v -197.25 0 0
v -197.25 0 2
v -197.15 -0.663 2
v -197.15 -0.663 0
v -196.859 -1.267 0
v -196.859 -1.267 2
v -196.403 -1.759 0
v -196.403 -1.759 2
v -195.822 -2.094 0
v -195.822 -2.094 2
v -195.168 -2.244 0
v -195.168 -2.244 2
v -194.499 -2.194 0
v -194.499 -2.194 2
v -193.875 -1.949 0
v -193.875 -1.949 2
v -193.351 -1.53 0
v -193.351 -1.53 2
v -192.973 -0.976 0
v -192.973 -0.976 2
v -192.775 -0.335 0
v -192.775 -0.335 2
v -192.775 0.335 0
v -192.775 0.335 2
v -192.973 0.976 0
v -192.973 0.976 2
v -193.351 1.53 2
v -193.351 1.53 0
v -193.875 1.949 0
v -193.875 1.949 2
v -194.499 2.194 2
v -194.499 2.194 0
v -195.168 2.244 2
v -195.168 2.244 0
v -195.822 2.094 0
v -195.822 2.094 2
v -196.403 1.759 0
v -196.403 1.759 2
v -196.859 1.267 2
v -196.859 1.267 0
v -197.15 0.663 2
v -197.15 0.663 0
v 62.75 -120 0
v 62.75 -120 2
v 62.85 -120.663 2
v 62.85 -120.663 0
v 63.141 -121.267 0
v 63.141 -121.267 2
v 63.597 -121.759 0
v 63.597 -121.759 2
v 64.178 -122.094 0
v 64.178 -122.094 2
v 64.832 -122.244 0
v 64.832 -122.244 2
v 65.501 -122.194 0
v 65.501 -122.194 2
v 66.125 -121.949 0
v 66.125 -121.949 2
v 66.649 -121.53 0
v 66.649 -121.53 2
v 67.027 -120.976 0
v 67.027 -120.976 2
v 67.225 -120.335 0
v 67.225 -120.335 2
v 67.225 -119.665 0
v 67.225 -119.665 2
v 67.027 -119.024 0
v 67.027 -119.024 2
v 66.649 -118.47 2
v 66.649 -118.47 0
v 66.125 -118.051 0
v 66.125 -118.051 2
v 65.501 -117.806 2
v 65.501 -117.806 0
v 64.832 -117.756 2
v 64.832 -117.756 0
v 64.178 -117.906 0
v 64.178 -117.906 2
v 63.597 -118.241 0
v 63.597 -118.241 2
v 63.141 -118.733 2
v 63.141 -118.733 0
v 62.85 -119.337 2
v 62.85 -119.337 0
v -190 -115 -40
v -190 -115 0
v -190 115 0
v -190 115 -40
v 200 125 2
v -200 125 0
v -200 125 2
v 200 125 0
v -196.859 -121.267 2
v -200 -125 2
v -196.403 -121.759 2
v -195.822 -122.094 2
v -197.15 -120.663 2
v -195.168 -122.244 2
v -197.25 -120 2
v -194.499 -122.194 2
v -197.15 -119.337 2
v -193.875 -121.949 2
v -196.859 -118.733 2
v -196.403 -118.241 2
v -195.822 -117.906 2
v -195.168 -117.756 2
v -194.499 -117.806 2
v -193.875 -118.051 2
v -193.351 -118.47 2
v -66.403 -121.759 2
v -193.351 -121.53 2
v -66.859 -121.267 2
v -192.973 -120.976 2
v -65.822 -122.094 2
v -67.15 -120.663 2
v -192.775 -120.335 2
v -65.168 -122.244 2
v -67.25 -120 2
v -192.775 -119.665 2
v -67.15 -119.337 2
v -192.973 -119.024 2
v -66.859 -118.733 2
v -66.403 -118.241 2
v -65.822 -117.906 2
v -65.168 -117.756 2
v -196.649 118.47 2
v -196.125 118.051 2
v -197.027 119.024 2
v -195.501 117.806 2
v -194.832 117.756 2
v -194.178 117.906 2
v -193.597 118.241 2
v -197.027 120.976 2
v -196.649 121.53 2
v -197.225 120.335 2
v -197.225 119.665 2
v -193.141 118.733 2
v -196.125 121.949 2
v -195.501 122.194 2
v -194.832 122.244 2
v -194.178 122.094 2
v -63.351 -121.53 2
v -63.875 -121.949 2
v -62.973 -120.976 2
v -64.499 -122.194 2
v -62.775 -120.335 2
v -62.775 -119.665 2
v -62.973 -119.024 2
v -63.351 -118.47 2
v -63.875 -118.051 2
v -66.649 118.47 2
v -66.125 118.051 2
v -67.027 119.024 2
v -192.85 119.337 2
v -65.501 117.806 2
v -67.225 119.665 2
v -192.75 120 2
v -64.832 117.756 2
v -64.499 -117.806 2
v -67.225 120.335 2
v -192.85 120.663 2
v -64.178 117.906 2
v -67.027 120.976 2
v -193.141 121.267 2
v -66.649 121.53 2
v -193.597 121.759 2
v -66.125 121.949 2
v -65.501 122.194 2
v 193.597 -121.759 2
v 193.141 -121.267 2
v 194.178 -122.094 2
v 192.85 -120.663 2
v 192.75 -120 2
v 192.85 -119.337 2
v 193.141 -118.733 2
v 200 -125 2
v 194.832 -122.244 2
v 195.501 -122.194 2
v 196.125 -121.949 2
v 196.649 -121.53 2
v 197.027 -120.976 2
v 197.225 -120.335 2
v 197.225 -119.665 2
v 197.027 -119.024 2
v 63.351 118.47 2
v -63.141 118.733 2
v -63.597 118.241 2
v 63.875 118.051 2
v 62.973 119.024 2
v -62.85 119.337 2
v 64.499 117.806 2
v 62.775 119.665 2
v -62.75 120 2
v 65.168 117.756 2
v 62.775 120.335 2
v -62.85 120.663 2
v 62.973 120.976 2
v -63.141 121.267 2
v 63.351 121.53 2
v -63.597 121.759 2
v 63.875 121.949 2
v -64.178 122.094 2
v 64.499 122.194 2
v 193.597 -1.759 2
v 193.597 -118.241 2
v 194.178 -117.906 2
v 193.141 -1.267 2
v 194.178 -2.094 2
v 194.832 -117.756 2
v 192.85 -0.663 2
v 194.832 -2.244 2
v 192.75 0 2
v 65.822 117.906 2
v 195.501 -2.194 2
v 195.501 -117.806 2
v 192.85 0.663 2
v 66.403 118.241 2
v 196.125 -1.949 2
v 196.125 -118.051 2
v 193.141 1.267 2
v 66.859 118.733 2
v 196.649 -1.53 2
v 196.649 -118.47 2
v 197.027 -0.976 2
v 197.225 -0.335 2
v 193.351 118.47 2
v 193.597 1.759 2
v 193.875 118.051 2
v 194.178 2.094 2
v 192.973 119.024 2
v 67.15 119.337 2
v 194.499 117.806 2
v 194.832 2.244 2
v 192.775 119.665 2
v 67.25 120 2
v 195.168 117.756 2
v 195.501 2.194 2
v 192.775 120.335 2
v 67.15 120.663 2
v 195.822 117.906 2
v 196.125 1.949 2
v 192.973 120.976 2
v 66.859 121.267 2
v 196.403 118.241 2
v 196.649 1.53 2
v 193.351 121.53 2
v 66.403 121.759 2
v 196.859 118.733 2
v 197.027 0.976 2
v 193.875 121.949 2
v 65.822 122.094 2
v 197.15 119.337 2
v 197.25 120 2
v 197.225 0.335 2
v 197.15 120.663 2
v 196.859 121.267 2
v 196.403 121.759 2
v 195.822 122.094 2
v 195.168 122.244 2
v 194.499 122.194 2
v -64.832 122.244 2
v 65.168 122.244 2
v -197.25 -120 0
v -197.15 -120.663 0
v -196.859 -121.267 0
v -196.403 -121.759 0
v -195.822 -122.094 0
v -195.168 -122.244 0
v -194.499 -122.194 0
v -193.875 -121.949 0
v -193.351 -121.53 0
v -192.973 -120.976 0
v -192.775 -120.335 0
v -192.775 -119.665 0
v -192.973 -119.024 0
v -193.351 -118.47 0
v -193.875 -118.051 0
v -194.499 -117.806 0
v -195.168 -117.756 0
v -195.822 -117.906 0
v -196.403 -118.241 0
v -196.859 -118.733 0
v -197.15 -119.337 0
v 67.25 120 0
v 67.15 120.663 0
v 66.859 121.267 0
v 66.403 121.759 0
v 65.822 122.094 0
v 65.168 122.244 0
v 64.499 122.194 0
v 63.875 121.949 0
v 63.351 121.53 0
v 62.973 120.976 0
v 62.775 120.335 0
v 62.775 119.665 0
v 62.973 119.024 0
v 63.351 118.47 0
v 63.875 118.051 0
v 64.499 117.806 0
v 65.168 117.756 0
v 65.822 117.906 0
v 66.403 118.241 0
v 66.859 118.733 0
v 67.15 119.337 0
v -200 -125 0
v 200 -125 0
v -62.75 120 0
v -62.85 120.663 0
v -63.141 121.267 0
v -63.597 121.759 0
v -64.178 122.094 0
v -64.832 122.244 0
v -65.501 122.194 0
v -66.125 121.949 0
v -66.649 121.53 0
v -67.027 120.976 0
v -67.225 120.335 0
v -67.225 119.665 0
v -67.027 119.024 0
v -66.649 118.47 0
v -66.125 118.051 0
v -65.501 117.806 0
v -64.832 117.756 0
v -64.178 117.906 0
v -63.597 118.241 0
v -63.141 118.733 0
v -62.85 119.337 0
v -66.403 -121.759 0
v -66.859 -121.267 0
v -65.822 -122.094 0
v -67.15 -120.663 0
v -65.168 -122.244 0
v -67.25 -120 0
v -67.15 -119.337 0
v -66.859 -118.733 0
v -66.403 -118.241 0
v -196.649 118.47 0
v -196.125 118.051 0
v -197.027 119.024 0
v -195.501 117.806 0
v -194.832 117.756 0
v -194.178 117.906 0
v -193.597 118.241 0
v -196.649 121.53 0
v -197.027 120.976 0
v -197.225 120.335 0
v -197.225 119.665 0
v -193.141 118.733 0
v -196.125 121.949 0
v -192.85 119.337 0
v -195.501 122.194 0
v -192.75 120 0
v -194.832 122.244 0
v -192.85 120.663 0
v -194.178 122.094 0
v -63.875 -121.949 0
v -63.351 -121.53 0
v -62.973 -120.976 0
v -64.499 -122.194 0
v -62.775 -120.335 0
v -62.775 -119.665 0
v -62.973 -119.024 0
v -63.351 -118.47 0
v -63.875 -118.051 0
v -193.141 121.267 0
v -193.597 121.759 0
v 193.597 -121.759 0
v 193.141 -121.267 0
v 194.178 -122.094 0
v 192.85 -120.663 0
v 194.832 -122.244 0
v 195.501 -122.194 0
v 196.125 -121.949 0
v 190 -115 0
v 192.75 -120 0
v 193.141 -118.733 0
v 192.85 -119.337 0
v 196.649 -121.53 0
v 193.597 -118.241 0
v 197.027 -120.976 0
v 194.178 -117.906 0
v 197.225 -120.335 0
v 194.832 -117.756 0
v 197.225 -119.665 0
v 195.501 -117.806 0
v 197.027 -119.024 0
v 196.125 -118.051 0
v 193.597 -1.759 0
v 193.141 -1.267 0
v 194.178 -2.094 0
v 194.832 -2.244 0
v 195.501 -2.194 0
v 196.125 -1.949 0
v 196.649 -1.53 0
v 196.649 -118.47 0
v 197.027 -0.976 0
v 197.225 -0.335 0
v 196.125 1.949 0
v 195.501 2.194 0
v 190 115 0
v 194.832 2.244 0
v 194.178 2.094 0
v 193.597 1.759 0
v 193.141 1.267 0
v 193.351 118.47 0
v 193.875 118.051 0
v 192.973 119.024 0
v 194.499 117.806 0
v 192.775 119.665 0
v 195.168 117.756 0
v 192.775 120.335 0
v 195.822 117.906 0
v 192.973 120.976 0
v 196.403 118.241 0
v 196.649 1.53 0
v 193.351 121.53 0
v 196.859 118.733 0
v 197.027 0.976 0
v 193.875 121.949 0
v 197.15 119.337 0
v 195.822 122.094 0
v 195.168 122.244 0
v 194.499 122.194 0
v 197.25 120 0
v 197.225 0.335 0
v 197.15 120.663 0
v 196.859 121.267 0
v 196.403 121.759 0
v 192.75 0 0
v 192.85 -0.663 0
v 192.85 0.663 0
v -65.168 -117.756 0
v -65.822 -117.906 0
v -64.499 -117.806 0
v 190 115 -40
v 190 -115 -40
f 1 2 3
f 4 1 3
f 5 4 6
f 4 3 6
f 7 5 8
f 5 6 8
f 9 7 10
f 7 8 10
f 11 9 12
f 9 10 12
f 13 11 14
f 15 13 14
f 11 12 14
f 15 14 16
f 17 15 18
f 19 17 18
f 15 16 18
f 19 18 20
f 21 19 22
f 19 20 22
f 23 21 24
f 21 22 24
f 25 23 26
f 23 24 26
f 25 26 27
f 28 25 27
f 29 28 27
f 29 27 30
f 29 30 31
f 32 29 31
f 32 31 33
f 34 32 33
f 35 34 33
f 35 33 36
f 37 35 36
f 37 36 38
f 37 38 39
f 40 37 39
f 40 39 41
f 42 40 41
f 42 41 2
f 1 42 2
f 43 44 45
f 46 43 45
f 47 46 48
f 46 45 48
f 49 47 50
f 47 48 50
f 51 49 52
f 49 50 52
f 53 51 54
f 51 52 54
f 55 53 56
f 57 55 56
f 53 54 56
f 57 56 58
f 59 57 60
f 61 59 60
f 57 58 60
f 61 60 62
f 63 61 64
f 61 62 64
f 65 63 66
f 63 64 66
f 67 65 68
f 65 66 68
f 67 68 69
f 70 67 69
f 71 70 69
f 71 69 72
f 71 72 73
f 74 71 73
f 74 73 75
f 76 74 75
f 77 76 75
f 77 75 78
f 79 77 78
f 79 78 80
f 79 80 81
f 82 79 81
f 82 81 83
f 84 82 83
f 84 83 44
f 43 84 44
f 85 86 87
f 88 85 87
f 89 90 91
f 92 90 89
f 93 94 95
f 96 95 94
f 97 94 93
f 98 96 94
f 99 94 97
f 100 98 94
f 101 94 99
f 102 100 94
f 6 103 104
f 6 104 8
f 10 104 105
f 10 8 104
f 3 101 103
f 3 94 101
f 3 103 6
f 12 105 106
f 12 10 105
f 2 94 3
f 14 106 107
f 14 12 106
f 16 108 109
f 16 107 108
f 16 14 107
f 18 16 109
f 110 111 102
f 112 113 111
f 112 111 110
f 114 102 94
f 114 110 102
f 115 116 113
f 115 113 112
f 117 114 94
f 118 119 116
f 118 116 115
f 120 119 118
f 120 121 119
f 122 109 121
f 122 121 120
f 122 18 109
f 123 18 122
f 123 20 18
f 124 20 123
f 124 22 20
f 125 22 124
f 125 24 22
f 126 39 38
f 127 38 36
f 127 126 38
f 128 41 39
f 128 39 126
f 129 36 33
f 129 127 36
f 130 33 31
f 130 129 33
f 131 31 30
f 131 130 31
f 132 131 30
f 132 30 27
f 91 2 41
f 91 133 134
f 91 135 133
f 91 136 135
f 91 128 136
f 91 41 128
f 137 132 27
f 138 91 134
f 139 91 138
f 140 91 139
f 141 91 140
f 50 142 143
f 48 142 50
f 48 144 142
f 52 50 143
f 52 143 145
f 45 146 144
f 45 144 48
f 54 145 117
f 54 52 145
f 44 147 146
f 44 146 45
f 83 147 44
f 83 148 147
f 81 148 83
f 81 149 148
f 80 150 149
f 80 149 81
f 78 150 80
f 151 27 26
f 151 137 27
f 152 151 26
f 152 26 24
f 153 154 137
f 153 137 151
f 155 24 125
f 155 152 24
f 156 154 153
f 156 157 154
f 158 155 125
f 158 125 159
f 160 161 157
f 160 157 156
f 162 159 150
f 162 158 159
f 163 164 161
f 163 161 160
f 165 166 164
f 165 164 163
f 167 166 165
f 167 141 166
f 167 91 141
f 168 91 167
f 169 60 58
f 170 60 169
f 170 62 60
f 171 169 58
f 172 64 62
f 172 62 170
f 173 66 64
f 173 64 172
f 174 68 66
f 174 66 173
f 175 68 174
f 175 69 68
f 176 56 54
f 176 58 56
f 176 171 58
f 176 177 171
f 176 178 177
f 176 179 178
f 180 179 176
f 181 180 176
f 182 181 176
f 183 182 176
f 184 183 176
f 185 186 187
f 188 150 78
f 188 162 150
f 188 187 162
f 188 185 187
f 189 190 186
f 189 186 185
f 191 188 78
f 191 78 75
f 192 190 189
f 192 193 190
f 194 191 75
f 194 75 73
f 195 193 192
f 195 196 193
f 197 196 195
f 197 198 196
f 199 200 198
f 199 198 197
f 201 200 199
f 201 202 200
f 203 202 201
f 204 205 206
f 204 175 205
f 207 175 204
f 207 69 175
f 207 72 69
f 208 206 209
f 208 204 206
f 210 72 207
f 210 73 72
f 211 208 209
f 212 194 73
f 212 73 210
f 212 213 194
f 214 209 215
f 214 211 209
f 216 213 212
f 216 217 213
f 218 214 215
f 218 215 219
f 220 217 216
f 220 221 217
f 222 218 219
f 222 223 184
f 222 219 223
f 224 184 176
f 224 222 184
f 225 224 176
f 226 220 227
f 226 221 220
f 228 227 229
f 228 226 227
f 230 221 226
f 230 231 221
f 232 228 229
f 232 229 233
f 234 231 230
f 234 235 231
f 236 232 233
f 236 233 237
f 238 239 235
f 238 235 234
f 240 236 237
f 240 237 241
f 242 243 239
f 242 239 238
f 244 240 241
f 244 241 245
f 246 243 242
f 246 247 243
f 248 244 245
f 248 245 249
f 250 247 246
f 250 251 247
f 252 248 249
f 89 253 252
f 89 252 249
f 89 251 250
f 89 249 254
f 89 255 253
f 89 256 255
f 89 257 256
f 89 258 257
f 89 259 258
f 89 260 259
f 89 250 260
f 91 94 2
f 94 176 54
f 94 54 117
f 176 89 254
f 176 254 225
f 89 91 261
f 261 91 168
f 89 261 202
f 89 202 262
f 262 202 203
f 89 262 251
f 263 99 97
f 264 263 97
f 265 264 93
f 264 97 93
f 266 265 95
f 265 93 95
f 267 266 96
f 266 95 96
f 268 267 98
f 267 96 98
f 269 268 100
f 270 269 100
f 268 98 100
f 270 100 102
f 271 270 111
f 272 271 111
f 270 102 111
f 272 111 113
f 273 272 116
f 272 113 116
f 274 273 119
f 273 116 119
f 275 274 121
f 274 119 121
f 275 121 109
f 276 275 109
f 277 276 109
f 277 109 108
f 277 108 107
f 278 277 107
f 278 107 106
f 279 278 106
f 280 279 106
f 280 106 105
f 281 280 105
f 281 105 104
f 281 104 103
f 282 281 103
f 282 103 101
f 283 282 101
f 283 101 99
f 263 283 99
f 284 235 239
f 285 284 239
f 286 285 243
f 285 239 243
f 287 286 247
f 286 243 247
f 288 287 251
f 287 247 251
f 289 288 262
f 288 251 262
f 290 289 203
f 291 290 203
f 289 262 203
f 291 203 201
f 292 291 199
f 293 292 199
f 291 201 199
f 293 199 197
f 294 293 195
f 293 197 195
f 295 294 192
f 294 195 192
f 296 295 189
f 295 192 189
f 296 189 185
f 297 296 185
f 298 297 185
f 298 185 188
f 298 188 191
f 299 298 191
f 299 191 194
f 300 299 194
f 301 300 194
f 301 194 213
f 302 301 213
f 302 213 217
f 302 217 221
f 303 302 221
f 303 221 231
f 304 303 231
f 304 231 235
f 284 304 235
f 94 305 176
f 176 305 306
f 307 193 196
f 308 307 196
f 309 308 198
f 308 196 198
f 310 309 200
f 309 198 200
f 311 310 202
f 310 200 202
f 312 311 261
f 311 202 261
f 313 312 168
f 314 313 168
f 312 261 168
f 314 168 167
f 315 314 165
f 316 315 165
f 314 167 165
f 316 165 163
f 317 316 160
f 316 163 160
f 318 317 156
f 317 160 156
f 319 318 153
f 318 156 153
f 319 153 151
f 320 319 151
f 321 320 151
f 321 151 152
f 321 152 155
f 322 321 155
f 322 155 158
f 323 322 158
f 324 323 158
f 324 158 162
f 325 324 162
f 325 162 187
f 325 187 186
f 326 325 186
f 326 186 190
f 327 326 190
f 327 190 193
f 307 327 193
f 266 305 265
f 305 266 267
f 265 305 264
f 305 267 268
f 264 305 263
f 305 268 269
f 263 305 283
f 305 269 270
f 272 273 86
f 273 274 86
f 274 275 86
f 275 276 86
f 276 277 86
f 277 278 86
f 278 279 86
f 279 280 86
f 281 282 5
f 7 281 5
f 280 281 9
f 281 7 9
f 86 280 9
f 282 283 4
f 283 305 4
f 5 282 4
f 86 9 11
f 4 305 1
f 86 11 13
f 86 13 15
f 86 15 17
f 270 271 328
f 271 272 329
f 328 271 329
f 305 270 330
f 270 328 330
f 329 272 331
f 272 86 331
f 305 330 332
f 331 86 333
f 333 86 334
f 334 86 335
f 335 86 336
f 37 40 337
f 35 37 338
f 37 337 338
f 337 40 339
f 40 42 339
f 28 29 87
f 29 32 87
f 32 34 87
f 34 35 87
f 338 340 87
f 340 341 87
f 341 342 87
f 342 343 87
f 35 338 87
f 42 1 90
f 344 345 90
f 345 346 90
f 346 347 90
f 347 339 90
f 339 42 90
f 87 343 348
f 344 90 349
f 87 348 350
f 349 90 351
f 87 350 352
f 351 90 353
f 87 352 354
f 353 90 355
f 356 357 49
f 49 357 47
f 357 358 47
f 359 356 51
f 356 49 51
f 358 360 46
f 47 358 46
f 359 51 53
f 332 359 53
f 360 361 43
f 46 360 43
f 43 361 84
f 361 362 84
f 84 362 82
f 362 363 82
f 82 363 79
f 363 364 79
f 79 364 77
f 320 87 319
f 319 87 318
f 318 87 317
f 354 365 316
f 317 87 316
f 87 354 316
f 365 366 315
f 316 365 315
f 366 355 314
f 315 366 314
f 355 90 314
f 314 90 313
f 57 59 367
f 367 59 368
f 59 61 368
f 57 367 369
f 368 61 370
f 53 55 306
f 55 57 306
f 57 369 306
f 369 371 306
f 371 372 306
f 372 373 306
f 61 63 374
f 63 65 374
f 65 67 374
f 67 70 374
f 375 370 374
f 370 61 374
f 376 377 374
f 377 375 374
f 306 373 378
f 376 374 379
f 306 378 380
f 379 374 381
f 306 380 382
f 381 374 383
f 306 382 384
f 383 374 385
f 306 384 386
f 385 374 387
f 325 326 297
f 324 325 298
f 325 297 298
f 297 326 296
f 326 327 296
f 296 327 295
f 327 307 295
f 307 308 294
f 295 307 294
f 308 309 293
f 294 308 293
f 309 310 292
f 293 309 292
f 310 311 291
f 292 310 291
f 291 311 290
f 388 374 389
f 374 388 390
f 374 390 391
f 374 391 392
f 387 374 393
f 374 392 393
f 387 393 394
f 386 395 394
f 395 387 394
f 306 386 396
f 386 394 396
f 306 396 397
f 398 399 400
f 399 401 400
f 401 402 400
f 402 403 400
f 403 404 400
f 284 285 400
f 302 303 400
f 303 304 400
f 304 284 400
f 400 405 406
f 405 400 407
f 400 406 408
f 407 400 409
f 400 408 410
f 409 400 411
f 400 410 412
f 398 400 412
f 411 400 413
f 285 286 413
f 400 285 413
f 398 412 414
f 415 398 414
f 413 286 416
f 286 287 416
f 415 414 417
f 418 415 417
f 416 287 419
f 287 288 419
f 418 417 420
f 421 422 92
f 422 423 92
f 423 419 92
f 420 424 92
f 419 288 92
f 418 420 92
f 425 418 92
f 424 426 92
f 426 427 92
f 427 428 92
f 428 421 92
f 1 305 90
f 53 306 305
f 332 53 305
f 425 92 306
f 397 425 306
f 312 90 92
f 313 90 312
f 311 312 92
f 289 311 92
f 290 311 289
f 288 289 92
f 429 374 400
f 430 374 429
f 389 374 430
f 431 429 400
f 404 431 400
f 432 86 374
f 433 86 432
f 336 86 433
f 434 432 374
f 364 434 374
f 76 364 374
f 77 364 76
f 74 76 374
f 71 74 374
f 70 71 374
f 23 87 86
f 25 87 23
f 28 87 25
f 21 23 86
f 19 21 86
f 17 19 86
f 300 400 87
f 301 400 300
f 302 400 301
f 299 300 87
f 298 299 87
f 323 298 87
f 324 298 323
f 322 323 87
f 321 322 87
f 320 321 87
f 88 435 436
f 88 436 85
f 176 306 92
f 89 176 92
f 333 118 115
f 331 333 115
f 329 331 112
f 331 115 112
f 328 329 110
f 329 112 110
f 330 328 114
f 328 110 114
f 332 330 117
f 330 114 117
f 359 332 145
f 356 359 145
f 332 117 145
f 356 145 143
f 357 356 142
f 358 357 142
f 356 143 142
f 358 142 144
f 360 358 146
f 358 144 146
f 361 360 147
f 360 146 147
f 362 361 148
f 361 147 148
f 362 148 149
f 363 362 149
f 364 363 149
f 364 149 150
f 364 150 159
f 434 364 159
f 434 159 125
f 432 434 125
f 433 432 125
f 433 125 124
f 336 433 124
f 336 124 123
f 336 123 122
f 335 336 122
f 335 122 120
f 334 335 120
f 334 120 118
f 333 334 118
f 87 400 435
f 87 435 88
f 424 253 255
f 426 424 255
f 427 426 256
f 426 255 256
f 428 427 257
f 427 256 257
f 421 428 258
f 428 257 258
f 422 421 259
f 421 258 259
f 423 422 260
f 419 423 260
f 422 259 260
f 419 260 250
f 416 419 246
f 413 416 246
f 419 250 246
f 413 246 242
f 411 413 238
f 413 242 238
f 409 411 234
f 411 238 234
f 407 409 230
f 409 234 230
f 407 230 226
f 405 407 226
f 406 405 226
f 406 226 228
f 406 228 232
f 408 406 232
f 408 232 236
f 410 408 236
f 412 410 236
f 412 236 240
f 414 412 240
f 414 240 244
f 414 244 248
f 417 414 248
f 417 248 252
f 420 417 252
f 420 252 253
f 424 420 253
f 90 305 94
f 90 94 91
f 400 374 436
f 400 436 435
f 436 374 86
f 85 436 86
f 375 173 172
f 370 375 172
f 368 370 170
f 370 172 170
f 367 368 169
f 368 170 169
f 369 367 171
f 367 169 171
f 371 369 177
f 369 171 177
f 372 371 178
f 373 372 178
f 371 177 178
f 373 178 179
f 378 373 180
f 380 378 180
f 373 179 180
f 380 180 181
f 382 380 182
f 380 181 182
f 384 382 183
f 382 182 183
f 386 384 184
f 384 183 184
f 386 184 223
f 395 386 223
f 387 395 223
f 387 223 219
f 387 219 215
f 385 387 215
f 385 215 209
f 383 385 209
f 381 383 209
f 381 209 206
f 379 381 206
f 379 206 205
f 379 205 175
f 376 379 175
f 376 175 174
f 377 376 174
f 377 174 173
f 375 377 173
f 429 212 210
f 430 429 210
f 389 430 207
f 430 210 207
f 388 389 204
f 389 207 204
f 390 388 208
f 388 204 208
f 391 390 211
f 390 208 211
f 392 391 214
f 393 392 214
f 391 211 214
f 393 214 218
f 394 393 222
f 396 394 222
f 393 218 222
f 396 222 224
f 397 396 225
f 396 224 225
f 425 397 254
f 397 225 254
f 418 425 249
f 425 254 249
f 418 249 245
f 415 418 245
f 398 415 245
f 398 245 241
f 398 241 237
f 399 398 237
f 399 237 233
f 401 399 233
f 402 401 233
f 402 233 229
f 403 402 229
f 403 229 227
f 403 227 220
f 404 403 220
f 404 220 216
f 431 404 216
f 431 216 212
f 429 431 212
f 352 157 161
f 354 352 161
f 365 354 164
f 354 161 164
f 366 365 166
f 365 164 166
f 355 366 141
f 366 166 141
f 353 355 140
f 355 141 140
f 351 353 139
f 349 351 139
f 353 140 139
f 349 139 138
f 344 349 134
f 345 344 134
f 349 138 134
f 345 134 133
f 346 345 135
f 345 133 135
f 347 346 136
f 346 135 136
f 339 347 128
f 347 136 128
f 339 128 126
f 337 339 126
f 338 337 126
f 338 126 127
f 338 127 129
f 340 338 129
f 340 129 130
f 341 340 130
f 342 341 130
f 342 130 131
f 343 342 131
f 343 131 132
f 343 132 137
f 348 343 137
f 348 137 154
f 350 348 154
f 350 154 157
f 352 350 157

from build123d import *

# Parameters (mm, degrees)
IZIM1_W                     = 400
IZIM1_H                     = 250
Y_KSEKLIK_EKSTR_ZYON1_DEPTH = 2
KES_EKSTR_ZYON1_REACH       = 237.858
IZIM3_R                     = 2.25
IZIM4_W                     = 380
IZIM4_H                     = 230
Y_KSEKLIK_EKSTR_ZYON2_DEPTH = 40


with BuildPart() as part:
    # Çizim1 → Yükseklik-Ekstrüzyon1 (new body)
    with BuildSketch(Plane.XY):
        Rectangle(IZIM1_W, IZIM1_H)
    extrude(amount=Y_KSEKLIK_EKSTR_ZYON1_DEPTH)

    # Çizim3 → Kes-Ekstrüzyon1 (cut, up to next)
    with BuildSketch(Plane.XY.offset(2), mode=Mode.PRIVATE) as kes_ekstr_zyon1_sk1:
        with Locations((-195, 120)):
            Circle(IZIM3_R)
    kes_ekstr_zyon1_tool1 = extrude(kes_ekstr_zyon1_sk1.sketch, amount=-KES_EKSTR_ZYON1_REACH, mode=Mode.PRIVATE) & part.part
    # Çizim3 → Kes-Ekstrüzyon1 (cut, up to next)
    with BuildSketch(Plane.XY.offset(2), mode=Mode.PRIVATE) as kes_ekstr_zyon1_sk2:
        with Locations((-65, 120)):
            Circle(IZIM3_R)
    kes_ekstr_zyon1_tool2 = extrude(kes_ekstr_zyon1_sk2.sketch, amount=-KES_EKSTR_ZYON1_REACH, mode=Mode.PRIVATE) & part.part
    # Çizim3 → Kes-Ekstrüzyon1 (cut, up to next)
    with BuildSketch(Plane.XY.offset(2), mode=Mode.PRIVATE) as kes_ekstr_zyon1_sk3:
        with Locations((65, 120)):
            Circle(IZIM3_R)
    kes_ekstr_zyon1_tool3 = extrude(kes_ekstr_zyon1_sk3.sketch, amount=-KES_EKSTR_ZYON1_REACH, mode=Mode.PRIVATE) & part.part
    # Çizim3 → Kes-Ekstrüzyon1 (cut, up to next)
    with BuildSketch(Plane.XY.offset(2), mode=Mode.PRIVATE) as kes_ekstr_zyon1_sk4:
        with Locations((195, 120)):
            Circle(IZIM3_R)
    kes_ekstr_zyon1_tool4 = extrude(kes_ekstr_zyon1_sk4.sketch, amount=-KES_EKSTR_ZYON1_REACH, mode=Mode.PRIVATE) & part.part
    # Çizim3 → Kes-Ekstrüzyon1 (cut, up to next)
    with BuildSketch(Plane.XY.offset(2), mode=Mode.PRIVATE) as kes_ekstr_zyon1_sk5:
        with Locations(Location((-65, -120, 0), (0, 0, 180))):
            Circle(IZIM3_R)
    kes_ekstr_zyon1_tool5 = extrude(kes_ekstr_zyon1_sk5.sketch, amount=-KES_EKSTR_ZYON1_REACH, mode=Mode.PRIVATE) & part.part
    # Çizim3 → Kes-Ekstrüzyon1 (cut, up to next)
    with BuildSketch(Plane.XY.offset(2), mode=Mode.PRIVATE) as kes_ekstr_zyon1_sk6:
        with Locations(Location((65, -120, 0), (0, 0, 180))):
            Circle(IZIM3_R)
    kes_ekstr_zyon1_tool6 = extrude(kes_ekstr_zyon1_sk6.sketch, amount=-KES_EKSTR_ZYON1_REACH, mode=Mode.PRIVATE) & part.part
    # Çizim3 → Kes-Ekstrüzyon1 (cut, up to next)
    with BuildSketch(Plane.XY.offset(2), mode=Mode.PRIVATE) as kes_ekstr_zyon1_sk7:
        with Locations(Location((195, -120, 0), (0, 0, 180))):
            Circle(IZIM3_R)
    kes_ekstr_zyon1_tool7 = extrude(kes_ekstr_zyon1_sk7.sketch, amount=-KES_EKSTR_ZYON1_REACH, mode=Mode.PRIVATE) & part.part
    # Çizim3 → Kes-Ekstrüzyon1 (cut, up to next)
    with BuildSketch(Plane.XY.offset(2), mode=Mode.PRIVATE) as kes_ekstr_zyon1_sk8:
        with Locations(Location((-195, -120, 0), (0, 0, 180))):
            Circle(IZIM3_R)
    kes_ekstr_zyon1_tool8 = extrude(kes_ekstr_zyon1_sk8.sketch, amount=-KES_EKSTR_ZYON1_REACH, mode=Mode.PRIVATE) & part.part
    # Çizim3 → Kes-Ekstrüzyon1 (cut, up to next)
    with BuildSketch(Plane.XY.offset(2), mode=Mode.PRIVATE) as kes_ekstr_zyon1_sk9:
        with Locations(Location((-195, 0, 0), (0, 0, 180))):
            Circle(IZIM3_R)
    kes_ekstr_zyon1_tool9 = extrude(kes_ekstr_zyon1_sk9.sketch, amount=-KES_EKSTR_ZYON1_REACH, mode=Mode.PRIVATE) & part.part
    # Çizim3 → Kes-Ekstrüzyon1 (cut, up to next)
    with BuildSketch(Plane.XY.offset(2), mode=Mode.PRIVATE) as kes_ekstr_zyon1_sk10:
        with Locations(Location((195, 0, 0), (0, 0, 180))):
            Circle(IZIM3_R)
    kes_ekstr_zyon1_tool10 = extrude(kes_ekstr_zyon1_sk10.sketch, amount=-KES_EKSTR_ZYON1_REACH, mode=Mode.PRIVATE) & part.part
    add(kes_ekstr_zyon1_tool1.solids().sort_by_distance((-195, 120, 2))[0], mode=Mode.SUBTRACT)
    add(kes_ekstr_zyon1_tool2.solids().sort_by_distance((-65, 120, 2))[0], mode=Mode.SUBTRACT)
    add(kes_ekstr_zyon1_tool3.solids().sort_by_distance((65, 120, 2))[0], mode=Mode.SUBTRACT)
    add(kes_ekstr_zyon1_tool4.solids().sort_by_distance((195, 120, 2))[0], mode=Mode.SUBTRACT)
    add(kes_ekstr_zyon1_tool5.solids().sort_by_distance((-65, -120, 2))[0], mode=Mode.SUBTRACT)
    add(kes_ekstr_zyon1_tool6.solids().sort_by_distance((65, -120, 2))[0], mode=Mode.SUBTRACT)
    add(kes_ekstr_zyon1_tool7.solids().sort_by_distance((195, -120, 2))[0], mode=Mode.SUBTRACT)
    add(kes_ekstr_zyon1_tool8.solids().sort_by_distance((-195, -120, 2))[0], mode=Mode.SUBTRACT)
    add(kes_ekstr_zyon1_tool9.solids().sort_by_distance((-195, 0, 2))[0], mode=Mode.SUBTRACT)
    add(kes_ekstr_zyon1_tool10.solids().sort_by_distance((195, 0, 2))[0], mode=Mode.SUBTRACT)

    # Çizim4 → Yükseklik-Ekstrüzyon2 (add)
    with BuildSketch(Plane(origin=(0, 0, 0), x_dir=(-1, 0, 0), z_dir=(0, 0, -1))):
        Rectangle(IZIM4_W, IZIM4_H)
    extrude(amount=Y_KSEKLIK_EKSTR_ZYON2_DEPTH)


solid = part.part
